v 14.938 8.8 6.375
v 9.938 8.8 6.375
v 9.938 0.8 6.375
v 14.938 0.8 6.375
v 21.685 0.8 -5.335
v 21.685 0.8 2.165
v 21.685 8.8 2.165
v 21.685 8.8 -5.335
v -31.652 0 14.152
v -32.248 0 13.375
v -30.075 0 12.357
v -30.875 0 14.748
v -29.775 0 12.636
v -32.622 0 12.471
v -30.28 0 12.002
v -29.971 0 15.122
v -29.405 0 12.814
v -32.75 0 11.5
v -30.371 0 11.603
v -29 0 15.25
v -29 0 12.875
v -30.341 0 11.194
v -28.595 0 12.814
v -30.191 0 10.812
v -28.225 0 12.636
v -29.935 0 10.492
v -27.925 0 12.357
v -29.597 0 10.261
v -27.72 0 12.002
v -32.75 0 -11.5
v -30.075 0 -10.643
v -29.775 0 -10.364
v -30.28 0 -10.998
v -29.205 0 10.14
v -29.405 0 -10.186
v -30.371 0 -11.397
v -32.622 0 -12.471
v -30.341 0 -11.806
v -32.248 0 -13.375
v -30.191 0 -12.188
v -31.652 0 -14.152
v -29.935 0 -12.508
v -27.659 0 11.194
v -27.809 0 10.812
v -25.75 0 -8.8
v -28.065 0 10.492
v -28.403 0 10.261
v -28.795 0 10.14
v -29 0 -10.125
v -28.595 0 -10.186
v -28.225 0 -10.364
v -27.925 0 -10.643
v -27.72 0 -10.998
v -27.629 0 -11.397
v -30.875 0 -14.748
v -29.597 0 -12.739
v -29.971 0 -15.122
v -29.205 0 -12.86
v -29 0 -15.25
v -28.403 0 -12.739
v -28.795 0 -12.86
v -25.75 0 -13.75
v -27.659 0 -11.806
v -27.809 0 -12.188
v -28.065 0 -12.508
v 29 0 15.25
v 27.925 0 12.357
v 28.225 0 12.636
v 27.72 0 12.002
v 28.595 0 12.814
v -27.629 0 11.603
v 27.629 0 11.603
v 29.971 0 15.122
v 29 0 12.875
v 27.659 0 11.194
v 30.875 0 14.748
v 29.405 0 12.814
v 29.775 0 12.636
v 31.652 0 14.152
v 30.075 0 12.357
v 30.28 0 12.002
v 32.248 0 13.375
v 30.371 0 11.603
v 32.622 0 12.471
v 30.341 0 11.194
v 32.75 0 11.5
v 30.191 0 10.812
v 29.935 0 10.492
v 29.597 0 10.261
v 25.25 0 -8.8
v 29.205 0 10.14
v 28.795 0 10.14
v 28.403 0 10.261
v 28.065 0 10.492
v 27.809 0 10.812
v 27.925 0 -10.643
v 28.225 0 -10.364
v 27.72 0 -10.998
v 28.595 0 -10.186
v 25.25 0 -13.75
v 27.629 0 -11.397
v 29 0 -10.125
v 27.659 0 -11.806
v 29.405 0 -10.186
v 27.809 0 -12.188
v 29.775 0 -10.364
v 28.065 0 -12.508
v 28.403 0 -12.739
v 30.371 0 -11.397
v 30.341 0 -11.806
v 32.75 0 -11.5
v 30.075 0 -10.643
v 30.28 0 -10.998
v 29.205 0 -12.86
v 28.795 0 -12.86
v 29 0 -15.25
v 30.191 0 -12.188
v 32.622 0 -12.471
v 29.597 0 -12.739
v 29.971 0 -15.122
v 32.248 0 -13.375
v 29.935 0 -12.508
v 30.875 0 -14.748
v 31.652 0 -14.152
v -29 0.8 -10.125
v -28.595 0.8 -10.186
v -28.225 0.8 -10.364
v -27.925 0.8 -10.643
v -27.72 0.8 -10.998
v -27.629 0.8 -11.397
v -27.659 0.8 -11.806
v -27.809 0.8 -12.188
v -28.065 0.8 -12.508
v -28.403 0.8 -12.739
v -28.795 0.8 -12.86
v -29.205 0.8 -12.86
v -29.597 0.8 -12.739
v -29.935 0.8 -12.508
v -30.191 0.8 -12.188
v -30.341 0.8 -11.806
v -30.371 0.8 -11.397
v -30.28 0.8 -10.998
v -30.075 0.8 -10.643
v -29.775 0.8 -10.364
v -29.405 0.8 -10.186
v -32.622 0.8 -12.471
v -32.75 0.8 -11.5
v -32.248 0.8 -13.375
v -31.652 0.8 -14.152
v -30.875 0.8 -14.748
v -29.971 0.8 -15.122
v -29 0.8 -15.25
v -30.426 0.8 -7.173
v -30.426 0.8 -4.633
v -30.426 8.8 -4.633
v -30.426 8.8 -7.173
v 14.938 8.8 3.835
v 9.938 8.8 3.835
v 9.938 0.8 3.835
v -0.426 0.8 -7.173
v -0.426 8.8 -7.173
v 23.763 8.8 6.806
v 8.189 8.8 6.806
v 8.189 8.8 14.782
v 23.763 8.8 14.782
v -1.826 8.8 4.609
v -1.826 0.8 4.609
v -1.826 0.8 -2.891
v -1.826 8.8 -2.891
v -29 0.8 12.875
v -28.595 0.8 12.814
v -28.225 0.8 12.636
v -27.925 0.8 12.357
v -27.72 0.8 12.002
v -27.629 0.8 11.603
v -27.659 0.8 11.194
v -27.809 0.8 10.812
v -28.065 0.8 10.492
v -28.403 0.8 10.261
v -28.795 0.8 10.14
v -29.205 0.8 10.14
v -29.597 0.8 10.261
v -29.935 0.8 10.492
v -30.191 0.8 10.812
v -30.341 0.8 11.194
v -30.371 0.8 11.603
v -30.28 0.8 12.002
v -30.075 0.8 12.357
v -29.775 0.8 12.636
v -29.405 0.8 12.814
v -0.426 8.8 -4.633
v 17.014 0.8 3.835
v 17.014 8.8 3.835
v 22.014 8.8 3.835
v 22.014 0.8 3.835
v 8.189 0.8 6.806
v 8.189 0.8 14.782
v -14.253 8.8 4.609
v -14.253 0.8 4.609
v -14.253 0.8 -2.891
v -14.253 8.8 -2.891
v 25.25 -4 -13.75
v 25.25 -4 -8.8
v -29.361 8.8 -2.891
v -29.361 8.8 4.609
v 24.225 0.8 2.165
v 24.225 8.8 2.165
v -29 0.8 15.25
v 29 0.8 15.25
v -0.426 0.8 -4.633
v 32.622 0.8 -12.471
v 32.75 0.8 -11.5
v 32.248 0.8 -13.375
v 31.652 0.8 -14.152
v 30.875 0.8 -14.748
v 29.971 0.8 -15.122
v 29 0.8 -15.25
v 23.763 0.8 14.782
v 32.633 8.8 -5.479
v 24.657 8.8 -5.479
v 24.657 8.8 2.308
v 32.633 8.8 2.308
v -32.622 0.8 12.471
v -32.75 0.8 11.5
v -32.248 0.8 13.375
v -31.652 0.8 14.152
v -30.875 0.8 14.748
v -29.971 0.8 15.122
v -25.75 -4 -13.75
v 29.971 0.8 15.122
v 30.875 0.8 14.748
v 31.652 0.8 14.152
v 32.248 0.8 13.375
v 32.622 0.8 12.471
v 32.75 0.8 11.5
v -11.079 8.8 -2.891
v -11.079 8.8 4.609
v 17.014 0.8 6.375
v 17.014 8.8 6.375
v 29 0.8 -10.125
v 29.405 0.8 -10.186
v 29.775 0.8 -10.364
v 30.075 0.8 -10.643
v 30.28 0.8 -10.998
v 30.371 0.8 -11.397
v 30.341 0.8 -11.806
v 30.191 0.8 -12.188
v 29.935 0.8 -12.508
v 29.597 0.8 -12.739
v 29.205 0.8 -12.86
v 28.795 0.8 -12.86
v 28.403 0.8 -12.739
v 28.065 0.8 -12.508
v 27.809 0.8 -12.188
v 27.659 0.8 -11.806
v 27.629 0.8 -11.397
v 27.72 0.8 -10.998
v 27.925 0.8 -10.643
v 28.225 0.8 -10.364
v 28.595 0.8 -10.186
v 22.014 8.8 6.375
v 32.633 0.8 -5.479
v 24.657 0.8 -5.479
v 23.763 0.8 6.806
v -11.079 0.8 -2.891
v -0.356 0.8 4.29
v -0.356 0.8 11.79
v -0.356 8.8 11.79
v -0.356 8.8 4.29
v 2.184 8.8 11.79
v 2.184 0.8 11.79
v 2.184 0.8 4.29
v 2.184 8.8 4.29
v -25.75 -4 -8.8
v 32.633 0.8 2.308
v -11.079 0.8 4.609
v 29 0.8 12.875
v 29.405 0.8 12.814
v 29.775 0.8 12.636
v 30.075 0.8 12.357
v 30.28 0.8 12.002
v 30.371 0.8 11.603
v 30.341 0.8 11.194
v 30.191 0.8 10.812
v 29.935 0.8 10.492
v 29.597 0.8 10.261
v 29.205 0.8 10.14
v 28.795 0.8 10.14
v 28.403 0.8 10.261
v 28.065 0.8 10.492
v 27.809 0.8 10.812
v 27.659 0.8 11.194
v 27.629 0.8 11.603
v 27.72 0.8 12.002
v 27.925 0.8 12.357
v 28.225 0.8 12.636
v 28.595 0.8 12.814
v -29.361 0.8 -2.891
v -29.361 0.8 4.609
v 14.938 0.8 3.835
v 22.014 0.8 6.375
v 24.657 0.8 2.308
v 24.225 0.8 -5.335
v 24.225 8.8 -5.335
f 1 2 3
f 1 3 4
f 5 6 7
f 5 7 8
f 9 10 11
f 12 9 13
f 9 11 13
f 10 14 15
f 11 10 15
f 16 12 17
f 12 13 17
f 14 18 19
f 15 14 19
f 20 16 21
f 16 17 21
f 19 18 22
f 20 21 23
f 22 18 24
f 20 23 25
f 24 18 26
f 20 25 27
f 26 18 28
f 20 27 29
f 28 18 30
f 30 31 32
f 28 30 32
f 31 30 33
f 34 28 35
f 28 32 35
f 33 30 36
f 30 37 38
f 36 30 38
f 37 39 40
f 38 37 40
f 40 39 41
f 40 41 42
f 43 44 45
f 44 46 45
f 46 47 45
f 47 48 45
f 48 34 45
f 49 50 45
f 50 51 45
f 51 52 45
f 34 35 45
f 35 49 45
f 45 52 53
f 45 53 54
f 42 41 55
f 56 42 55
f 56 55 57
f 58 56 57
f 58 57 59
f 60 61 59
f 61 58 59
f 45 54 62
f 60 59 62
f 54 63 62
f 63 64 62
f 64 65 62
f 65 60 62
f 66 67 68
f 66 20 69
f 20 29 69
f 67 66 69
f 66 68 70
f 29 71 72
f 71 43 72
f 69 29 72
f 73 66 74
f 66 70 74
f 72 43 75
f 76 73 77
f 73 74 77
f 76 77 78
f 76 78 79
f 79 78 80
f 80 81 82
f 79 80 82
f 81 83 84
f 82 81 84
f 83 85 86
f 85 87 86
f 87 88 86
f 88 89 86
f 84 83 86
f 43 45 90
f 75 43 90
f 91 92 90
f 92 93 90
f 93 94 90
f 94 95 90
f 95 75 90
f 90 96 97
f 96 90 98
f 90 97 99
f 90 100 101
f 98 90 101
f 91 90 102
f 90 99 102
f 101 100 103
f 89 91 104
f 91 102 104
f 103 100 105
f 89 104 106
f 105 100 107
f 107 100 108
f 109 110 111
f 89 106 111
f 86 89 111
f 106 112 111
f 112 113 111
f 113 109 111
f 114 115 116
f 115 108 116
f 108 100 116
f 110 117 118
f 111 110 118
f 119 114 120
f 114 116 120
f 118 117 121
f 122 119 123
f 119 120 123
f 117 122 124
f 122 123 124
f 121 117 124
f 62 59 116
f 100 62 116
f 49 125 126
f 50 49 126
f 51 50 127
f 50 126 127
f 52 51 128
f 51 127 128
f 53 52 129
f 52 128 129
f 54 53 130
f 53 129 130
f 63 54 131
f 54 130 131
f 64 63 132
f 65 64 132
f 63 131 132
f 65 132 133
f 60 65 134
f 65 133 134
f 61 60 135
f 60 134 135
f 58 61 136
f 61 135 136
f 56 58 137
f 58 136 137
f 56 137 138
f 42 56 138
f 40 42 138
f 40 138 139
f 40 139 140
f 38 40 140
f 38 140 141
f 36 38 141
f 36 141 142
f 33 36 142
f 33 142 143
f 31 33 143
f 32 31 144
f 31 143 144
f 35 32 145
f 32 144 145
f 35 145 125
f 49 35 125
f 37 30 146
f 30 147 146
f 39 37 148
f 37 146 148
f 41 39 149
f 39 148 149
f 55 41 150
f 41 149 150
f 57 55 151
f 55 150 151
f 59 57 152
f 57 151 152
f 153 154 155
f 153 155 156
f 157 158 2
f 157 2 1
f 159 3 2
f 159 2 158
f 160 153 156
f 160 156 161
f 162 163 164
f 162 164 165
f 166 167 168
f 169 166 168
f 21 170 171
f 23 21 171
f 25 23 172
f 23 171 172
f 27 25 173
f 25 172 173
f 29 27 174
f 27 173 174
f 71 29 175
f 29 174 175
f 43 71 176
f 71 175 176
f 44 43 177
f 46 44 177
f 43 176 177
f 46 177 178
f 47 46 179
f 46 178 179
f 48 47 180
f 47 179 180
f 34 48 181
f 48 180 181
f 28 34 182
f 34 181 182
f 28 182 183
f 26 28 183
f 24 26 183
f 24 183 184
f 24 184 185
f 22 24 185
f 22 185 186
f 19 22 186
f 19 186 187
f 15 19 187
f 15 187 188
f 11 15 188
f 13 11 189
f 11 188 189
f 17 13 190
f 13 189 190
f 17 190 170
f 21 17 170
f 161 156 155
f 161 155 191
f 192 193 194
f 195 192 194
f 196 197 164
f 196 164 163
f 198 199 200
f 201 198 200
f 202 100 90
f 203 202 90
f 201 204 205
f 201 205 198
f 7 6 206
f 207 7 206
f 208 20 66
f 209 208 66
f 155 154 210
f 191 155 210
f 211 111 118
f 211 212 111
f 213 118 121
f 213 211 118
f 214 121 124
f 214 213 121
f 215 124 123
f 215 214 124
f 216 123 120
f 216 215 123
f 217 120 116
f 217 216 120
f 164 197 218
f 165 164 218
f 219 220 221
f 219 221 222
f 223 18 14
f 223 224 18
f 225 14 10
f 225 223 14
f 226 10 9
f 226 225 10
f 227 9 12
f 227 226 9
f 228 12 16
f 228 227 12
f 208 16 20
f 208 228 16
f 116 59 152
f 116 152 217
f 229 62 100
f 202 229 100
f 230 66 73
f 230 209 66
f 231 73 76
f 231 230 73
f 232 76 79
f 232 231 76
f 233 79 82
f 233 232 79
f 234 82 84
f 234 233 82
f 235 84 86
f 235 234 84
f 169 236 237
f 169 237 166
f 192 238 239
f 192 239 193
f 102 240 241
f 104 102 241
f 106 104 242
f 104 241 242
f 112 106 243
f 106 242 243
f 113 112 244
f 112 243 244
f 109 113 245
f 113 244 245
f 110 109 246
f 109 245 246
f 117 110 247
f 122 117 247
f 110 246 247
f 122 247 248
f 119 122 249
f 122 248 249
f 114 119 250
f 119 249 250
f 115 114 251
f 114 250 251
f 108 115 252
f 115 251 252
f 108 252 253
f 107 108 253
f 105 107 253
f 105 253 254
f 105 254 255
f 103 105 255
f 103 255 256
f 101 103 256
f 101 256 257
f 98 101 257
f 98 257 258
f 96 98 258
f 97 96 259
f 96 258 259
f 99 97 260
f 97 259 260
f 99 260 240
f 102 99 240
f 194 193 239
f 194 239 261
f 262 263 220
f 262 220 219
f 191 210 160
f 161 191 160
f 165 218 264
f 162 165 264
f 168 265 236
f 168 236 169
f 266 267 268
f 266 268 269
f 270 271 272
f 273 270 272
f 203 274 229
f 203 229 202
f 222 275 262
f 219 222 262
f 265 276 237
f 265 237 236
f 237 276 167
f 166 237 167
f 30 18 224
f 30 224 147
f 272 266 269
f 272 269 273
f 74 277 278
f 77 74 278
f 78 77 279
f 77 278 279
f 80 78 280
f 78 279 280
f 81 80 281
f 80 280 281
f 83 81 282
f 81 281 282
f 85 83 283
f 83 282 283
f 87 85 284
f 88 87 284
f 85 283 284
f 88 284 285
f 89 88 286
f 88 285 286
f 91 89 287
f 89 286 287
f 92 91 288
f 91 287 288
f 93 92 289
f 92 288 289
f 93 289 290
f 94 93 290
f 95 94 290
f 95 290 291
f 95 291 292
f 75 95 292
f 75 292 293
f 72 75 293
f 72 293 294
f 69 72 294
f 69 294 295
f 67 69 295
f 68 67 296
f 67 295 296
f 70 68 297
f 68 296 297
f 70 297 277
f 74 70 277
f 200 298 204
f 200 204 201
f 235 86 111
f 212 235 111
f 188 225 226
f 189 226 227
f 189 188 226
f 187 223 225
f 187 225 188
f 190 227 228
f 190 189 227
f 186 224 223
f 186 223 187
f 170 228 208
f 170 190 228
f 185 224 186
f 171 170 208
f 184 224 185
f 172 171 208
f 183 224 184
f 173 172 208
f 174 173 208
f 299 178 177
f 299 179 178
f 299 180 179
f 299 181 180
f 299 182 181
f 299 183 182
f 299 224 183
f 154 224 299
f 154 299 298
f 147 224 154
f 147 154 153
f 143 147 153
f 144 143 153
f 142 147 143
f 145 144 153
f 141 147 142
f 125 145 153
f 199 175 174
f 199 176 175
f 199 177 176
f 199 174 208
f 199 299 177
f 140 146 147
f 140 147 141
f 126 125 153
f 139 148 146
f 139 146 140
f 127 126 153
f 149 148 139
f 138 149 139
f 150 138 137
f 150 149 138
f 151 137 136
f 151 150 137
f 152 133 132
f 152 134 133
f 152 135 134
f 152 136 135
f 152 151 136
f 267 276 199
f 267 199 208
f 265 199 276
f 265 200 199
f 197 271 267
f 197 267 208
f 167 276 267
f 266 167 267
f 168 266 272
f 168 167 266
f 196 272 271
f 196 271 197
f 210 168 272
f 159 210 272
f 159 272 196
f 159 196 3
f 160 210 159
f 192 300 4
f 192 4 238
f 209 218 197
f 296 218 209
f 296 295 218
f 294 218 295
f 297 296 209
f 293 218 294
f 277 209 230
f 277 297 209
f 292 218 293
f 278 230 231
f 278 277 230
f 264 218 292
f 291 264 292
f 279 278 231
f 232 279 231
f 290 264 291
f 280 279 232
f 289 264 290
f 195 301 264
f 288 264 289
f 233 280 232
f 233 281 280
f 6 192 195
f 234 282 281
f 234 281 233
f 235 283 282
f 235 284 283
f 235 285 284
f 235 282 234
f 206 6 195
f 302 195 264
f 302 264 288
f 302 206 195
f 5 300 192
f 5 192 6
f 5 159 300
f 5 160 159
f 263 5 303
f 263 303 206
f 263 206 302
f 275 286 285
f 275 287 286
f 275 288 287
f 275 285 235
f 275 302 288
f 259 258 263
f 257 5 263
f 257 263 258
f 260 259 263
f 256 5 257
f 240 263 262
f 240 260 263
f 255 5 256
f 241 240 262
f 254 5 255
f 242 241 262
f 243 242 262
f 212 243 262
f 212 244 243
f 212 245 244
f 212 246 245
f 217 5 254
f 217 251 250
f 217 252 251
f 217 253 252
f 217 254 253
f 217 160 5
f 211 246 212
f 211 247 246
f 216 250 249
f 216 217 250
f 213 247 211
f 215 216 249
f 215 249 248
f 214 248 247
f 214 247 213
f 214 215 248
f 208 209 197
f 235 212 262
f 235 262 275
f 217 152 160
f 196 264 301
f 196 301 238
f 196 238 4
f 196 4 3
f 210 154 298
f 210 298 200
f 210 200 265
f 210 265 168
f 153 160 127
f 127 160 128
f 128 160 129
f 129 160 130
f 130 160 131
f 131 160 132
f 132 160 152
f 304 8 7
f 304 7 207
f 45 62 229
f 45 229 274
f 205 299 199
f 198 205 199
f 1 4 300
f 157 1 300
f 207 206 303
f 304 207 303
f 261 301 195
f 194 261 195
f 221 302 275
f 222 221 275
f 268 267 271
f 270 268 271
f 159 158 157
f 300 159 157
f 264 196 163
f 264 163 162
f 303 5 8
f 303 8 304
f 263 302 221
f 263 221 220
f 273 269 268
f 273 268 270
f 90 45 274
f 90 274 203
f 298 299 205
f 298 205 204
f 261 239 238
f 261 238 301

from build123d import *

# Parameters (mm, degrees)
SKETCH1_W           = 65.5
SKETCH1_H           = 30.5
BOSS_EXTRUDE1_DEPTH = 0.8
FILLET1_R           = 3.75
SKETCH2_R           = 1.375
CUT_EXTRUDE1_DEPTH  = 0.8
SKETCH3_W           = 30
SKETCH3_H           = 2.54
SKETCH3_W_2         = 9.253232542
SKETCH3_H_2         = 7.5
SKETCH3_W_3         = 15.108584743
SKETCH3_W_4         = 2.54
SKETCH3_W_5         = 15.573110358
SKETCH3_H_3         = 7.975960023
SKETCH3_W_6         = 5
SKETCH3_W_7         = 7.975960023
SKETCH3_H_4         = 7.78655518
BOSS_EXTRUDE2_DEPTH = 8
SKETCH4_W           = 51
SKETCH4_H           = 4.95
BOSS_EXTRUDE3_DEPTH = 4


with BuildPart() as part:
    # Sketch1 → Boss-Extrude1 (new body)
    with BuildSketch(Plane(origin=(0, 0, 0), x_dir=(1, 0, 0), z_dir=(0, 1, 0))):
        Rectangle(SKETCH1_W, SKETCH1_H)
    extrude(amount=BOSS_EXTRUDE1_DEPTH)

    # Fillet1
    fillet1_edges = [part.edges().sort_by_distance(p)[0] for p in [
        (-32.75, 0.4, -15.25),
        (32.75, 0.4, -15.25),
        (32.75, 0.4, 15.25),
        (-32.75, 0.4, 15.25),
    ]]
    fillet(fillet1_edges, radius=FILLET1_R)

    # Sketch2 → Cut-Extrude1 (cut)
    with BuildSketch(Plane(origin=(0, 0.8, 0), x_dir=(1, 0, 0), z_dir=(0, 1, 0))):
        with Locations(Location((-29, 11.5, 0), (0, 0, 270))):
            Circle(SKETCH2_R)
        with Locations(Location((-29, -11.5, 0), (0, 0, 270))):
            Circle(SKETCH2_R)
        with Locations(Location((29, -11.5, 0), (0, 0, 270))):
            Circle(SKETCH2_R)
        with Locations(Location((29, 11.5, 0), (0, 0, 270))):
            Circle(SKETCH2_R)
    extrude(amount=-CUT_EXTRUDE1_DEPTH, mode=Mode.SUBTRACT)

    # Sketch3 → Boss-Extrude2 (add)
    with BuildSketch(Plane(origin=(0, 0.8, 0), x_dir=(1, 0, 0), z_dir=(0, 1, 0))):
        with Locations((-15.426255017, 5.90276931)):
            Rectangle(SKETCH3_W, SKETCH3_H)
        with Locations((-6.452192743, -0.859199982)):
            Rectangle(SKETCH3_W_2, SKETCH3_H_2)
        with Locations((-21.80689744, -0.859199982)):
            Rectangle(SKETCH3_W_3, SKETCH3_H_2)
        with Locations((0.91413656, -8.040321366)):
            Rectangle(SKETCH3_W_4, SKETCH3_H_2)
        with Locations((15.976005132, -10.794375696)):
            Rectangle(SKETCH3_W_5, SKETCH3_H_3)
        with Locations((22.955137287, 1.585350321)):
            Rectangle(SKETCH3_W_4, SKETCH3_H_2)
        with Locations((12.438021136, -5.10451856)):
            Rectangle(SKETCH3_W_6, SKETCH3_H)
        with Locations((19.513989128, -5.10451856)):
            Rectangle(SKETCH3_W_6, SKETCH3_H)
        with Locations((28.644994423, 1.585350321)):
            Rectangle(SKETCH3_W_7, SKETCH3_H_4)
    extrude(amount=BOSS_EXTRUDE2_DEPTH)

    # Sketch4 → Boss-Extrude3 (add)
    with BuildSketch(Plane.XZ):
        with Locations((-0.25, -11.275)):
            Rectangle(SKETCH4_W, SKETCH4_H)
    extrude(amount=BOSS_EXTRUDE3_DEPTH)


solid = part.part
